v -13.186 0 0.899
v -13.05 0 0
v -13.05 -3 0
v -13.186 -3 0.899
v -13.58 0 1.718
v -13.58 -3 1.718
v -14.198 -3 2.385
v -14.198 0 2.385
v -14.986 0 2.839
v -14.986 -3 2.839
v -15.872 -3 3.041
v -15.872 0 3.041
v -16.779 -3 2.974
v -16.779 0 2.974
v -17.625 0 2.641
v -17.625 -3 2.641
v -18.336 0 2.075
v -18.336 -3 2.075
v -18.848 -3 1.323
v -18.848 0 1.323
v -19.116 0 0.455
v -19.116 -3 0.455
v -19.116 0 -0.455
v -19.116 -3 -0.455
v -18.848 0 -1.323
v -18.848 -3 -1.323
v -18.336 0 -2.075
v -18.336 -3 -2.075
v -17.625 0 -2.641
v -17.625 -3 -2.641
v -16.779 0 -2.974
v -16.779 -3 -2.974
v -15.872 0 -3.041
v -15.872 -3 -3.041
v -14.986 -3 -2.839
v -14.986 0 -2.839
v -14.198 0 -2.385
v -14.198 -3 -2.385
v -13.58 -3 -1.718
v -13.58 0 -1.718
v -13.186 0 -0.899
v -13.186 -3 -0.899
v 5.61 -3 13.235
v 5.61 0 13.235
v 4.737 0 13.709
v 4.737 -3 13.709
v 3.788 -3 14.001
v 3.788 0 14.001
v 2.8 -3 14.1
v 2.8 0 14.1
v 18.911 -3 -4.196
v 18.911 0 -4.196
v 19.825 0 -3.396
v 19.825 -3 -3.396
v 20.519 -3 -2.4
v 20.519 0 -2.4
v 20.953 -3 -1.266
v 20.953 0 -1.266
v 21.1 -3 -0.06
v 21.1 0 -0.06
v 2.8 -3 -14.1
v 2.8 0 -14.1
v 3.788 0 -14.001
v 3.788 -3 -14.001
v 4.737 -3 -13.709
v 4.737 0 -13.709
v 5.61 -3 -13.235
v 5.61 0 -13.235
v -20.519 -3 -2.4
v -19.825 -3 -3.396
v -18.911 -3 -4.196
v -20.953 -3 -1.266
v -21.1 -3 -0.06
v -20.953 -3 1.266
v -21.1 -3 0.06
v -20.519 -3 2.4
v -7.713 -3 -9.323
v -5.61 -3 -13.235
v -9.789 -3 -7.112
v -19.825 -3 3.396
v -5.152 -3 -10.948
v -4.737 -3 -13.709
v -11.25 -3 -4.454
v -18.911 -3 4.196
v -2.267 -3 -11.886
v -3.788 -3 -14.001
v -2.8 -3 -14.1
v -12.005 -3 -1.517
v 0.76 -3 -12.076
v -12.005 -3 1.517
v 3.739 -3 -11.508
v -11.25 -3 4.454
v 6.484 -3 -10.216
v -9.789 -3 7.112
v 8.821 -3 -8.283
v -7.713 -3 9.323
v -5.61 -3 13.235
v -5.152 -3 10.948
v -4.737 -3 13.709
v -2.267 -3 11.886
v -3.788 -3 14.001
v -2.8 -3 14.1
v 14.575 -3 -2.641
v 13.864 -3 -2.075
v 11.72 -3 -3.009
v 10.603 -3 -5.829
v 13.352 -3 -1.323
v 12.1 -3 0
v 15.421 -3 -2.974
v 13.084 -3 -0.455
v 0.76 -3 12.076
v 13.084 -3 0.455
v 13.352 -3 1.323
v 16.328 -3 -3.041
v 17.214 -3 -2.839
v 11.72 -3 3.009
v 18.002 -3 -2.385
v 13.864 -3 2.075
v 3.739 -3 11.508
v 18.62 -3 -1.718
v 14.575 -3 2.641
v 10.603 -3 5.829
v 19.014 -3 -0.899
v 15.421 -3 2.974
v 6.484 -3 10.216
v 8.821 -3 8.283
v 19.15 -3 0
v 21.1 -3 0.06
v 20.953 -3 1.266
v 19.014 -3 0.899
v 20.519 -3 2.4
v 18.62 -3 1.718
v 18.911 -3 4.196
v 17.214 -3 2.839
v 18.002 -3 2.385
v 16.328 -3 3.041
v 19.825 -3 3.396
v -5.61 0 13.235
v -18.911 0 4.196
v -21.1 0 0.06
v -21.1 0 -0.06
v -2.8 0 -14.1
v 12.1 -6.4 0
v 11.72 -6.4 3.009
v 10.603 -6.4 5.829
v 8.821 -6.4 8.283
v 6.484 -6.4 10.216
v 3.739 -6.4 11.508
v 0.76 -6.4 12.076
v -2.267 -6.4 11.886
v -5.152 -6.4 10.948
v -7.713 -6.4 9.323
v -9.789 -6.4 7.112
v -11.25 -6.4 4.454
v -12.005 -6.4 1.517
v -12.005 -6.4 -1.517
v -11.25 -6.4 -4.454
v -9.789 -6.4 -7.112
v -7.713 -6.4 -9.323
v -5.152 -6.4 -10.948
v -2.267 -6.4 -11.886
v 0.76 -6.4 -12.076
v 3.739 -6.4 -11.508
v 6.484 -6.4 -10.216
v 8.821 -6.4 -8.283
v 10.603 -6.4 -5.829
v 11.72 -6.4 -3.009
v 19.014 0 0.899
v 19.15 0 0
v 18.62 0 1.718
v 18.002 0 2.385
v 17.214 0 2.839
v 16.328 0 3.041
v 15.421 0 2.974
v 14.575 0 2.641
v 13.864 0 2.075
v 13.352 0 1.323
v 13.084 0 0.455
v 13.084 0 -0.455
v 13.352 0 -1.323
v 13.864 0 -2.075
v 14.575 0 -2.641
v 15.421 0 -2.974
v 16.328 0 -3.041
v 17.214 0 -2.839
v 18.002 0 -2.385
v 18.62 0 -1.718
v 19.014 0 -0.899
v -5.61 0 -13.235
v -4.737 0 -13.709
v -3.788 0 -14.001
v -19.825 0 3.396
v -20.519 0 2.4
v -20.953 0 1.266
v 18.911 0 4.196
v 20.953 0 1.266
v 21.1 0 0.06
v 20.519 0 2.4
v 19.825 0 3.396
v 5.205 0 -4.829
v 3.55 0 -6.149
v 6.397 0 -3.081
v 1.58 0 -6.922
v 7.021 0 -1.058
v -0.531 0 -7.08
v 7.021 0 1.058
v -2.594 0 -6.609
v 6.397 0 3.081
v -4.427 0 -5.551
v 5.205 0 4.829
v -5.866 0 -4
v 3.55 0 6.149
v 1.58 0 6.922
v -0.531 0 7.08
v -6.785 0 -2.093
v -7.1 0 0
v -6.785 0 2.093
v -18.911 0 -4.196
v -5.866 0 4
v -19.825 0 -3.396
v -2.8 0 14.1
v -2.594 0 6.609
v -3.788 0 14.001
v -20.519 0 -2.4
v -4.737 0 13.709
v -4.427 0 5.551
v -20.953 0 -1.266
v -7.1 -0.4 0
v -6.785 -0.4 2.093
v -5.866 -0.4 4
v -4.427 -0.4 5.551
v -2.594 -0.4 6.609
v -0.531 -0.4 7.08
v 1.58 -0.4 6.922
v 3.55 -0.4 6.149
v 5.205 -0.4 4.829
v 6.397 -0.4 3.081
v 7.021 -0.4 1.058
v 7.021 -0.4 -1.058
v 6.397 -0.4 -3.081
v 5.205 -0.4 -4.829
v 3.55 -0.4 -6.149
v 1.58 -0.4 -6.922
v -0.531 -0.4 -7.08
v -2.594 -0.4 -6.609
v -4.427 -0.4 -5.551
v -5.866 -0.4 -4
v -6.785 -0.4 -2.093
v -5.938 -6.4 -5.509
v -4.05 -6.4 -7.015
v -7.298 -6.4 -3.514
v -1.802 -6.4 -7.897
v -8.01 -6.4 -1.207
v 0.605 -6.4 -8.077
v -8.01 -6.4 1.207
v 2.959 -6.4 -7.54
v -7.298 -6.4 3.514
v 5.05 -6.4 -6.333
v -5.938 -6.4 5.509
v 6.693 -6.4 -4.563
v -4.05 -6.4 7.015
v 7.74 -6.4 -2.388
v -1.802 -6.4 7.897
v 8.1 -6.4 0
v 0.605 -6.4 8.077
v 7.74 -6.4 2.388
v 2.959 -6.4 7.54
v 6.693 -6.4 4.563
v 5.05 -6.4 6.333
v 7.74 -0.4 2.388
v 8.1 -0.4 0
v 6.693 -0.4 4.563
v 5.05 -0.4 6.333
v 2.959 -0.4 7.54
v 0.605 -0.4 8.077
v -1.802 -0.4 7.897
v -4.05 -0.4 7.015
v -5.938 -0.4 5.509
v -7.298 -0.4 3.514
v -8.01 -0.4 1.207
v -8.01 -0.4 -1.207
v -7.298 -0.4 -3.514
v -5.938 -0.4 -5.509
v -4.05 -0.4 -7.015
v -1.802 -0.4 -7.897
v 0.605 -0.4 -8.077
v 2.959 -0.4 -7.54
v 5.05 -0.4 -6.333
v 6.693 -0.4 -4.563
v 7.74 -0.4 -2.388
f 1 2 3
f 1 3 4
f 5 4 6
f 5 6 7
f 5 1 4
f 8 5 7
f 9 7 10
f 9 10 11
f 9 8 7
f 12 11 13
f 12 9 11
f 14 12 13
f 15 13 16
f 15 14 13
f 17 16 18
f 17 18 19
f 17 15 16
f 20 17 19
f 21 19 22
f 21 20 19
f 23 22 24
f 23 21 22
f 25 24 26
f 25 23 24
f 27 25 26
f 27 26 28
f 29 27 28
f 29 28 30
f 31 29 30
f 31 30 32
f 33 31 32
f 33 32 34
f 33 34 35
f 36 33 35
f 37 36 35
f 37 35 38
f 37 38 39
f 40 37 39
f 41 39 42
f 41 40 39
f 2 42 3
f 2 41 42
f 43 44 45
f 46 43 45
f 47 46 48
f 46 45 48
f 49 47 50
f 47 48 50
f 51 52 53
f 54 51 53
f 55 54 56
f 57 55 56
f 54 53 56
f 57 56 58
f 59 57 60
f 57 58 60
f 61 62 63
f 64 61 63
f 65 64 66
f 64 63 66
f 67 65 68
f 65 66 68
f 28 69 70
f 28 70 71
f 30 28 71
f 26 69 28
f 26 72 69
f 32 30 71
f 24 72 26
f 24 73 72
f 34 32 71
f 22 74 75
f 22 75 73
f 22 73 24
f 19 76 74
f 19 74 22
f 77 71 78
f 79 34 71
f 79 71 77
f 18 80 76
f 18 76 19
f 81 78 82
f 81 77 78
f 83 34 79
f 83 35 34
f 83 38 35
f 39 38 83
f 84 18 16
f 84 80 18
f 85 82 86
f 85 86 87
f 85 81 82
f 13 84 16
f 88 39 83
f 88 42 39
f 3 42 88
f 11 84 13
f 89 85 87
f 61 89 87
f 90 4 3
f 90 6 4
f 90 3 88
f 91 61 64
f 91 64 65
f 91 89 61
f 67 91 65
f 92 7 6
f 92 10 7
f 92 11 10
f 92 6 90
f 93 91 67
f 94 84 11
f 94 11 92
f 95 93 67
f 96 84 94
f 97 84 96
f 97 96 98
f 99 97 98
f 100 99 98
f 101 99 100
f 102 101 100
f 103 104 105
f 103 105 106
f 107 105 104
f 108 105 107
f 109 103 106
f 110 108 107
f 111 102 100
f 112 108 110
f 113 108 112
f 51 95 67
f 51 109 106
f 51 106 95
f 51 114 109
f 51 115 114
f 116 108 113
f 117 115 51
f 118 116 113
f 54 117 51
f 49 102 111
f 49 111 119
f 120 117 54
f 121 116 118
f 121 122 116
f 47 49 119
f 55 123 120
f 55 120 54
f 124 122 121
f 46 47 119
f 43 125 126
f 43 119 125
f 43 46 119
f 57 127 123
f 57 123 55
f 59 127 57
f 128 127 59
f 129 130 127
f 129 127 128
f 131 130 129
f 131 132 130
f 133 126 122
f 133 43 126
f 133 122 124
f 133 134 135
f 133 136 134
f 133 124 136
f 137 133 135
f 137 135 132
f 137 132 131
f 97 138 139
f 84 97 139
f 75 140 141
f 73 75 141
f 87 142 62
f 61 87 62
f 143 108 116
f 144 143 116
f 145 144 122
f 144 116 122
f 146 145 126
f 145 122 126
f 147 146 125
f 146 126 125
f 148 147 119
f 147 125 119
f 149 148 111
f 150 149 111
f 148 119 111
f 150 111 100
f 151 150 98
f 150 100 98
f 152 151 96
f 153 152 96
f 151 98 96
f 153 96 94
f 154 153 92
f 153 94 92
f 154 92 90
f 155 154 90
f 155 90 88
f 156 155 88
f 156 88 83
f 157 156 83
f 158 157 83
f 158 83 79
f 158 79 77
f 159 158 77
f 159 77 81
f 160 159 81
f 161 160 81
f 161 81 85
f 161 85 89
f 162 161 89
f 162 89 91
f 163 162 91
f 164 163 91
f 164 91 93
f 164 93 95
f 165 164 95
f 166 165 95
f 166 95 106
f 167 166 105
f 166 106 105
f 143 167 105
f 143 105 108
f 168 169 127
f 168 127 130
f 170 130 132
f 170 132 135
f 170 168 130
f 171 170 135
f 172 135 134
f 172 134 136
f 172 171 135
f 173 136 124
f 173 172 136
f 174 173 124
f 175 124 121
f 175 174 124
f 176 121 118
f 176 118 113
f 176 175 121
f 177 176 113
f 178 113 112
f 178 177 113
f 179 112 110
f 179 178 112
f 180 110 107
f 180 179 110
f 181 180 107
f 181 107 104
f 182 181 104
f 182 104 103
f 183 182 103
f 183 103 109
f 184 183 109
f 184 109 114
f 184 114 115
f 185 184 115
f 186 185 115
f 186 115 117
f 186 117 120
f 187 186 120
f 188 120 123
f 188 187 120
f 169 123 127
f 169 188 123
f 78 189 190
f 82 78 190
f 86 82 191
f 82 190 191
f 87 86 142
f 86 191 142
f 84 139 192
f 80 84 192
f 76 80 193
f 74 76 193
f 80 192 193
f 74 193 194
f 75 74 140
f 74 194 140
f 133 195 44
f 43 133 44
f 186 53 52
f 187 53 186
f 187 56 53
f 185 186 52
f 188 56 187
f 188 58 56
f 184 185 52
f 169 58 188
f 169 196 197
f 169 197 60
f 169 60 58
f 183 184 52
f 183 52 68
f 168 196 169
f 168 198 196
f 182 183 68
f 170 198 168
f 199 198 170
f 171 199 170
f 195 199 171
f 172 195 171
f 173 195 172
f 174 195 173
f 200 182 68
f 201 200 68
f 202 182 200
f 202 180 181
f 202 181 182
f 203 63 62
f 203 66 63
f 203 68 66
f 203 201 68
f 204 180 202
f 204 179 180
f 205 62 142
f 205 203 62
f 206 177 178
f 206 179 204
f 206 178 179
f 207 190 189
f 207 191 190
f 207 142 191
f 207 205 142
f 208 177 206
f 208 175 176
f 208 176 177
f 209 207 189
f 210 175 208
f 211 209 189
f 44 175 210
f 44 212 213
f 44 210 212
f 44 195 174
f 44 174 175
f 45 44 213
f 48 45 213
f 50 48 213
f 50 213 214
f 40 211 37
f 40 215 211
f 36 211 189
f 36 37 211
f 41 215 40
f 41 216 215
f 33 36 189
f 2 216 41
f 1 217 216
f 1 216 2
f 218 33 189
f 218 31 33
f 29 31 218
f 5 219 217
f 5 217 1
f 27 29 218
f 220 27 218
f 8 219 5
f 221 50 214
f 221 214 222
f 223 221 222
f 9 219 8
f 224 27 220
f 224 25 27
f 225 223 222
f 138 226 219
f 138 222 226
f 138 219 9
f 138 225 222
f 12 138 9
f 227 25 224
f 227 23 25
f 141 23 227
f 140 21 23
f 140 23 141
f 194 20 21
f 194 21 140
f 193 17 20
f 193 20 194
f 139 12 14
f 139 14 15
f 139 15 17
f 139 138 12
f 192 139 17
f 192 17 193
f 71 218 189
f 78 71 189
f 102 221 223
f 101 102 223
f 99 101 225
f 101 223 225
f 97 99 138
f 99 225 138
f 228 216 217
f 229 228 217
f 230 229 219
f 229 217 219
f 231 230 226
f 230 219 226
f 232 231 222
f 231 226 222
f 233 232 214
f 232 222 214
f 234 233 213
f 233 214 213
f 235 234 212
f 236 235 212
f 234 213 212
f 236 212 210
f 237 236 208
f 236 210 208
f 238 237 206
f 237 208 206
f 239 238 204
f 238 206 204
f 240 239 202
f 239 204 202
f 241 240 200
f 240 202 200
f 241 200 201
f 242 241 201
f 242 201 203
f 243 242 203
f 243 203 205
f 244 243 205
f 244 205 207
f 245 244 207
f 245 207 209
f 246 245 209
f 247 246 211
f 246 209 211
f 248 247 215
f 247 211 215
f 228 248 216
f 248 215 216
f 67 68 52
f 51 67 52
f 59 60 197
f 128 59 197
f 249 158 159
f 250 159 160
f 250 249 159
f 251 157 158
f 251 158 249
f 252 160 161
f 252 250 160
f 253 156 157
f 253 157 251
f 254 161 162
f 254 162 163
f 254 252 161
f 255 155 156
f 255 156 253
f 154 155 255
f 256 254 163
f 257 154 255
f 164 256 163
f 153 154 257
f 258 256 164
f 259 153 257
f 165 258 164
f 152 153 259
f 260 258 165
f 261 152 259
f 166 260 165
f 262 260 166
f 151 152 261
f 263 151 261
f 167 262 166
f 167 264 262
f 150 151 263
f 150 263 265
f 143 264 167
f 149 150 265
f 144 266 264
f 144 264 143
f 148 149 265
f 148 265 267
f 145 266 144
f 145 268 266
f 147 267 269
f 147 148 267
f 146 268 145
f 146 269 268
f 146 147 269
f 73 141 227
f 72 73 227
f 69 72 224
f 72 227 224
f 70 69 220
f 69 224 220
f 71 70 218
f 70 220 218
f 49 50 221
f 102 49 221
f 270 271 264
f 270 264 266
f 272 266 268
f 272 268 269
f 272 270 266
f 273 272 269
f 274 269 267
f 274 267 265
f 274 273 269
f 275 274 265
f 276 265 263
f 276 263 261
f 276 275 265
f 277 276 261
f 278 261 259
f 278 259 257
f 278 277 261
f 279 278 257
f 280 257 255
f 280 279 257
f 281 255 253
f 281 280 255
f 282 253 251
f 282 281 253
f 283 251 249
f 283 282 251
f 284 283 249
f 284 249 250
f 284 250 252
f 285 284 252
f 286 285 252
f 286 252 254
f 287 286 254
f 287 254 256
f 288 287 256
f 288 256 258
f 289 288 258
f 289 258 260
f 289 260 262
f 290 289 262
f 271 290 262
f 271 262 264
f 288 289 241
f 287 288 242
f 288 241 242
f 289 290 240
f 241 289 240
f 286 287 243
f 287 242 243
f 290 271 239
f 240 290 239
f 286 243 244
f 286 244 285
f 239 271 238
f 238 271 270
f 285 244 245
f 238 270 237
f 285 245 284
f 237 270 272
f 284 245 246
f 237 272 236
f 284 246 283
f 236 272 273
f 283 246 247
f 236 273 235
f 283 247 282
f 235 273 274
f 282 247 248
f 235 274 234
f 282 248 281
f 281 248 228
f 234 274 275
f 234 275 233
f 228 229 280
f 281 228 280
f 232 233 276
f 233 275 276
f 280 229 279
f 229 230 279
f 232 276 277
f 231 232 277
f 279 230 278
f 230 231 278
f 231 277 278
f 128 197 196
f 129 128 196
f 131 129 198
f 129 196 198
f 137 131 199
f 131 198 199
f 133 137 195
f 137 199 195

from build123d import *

# Parameters (mm, degrees)
F0_R     = 12.1
F0_R_2   = 8.1
F1_DEPTH = 6.4
F0_R_3   = 3.05
F2_DEPTH = 3
F3_R     = 8.1
F3_R_2   = 7.1
F4_DEPTH = 0.4


with BuildPart() as f1:
    # F0 (on Front) → F1 (new body)
    with BuildSketch(Plane.XZ):
        Circle(F0_R)
        Circle(F0_R_2, mode=Mode.SUBTRACT)
    extrude(amount=F1_DEPTH)

    # F0 (on Front) → F2 (join)
    with BuildSketch(Plane.XZ):
        with BuildLine():
            Line((-2.799697, -14.1), (2.799697, -14.1))
            ThreePointArc((2.799697, -14.1), (4.26998, -13.87894), (5.610256, -13.235306))
            Line((5.610256, -13.235306), (18.910559, -4.195761))
            ThreePointArc((18.910559, -4.195761), (20.518868, -2.400028), (21.1, -0.060455))
            Line((21.1, -0.060455), (21.1, 0.060455))
            ThreePointArc((21.1, 0.060455), (20.518868, 2.400028), (18.910559, 4.195761))
            Line((18.910559, 4.195761), (5.610256, 13.235306))
            ThreePointArc((5.610256, 13.235306), (4.26998, 13.87894), (2.799697, 14.1))
            Line((2.799697, 14.1), (-2.799697, 14.1))
            ThreePointArc((-2.799697, 14.1), (-4.26998, 13.87894), (-5.610256, 13.235306))
            Line((-5.610256, 13.235306), (-18.910559, 4.195761))
            ThreePointArc((-18.910559, 4.195761), (-20.518868, 2.400028), (-21.1, 0.060455))
            Line((-21.1, 0.060455), (-21.1, -0.060455))
            ThreePointArc((-21.1, -0.060455), (-20.518868, -2.400028), (-18.910559, -4.195761))
            Line((-18.910559, -4.195761), (-5.610256, -13.235306))
            ThreePointArc((-5.610256, -13.235306), (-4.26998, -13.87894), (-2.799697, -14.1))
        make_face()
        with Locations((-16.1, 0)):
            Circle(F0_R_3, mode=Mode.SUBTRACT)
        Circle(F0_R, mode=Mode.SUBTRACT)
        with Locations((16.1, 0)):
            Circle(F0_R_3, mode=Mode.SUBTRACT)
    extrude(amount=F2_DEPTH)

    # F3 (on face) → F4 (join)
    with BuildSketch(Plane(origin=(0, 0, 0), x_dir=(-1, 0, 0), z_dir=(0, 1, 0))):
        Circle(F3_R)
        Circle(F3_R_2, mode=Mode.SUBTRACT)
    extrude(amount=-F4_DEPTH)


solid = f1.part
